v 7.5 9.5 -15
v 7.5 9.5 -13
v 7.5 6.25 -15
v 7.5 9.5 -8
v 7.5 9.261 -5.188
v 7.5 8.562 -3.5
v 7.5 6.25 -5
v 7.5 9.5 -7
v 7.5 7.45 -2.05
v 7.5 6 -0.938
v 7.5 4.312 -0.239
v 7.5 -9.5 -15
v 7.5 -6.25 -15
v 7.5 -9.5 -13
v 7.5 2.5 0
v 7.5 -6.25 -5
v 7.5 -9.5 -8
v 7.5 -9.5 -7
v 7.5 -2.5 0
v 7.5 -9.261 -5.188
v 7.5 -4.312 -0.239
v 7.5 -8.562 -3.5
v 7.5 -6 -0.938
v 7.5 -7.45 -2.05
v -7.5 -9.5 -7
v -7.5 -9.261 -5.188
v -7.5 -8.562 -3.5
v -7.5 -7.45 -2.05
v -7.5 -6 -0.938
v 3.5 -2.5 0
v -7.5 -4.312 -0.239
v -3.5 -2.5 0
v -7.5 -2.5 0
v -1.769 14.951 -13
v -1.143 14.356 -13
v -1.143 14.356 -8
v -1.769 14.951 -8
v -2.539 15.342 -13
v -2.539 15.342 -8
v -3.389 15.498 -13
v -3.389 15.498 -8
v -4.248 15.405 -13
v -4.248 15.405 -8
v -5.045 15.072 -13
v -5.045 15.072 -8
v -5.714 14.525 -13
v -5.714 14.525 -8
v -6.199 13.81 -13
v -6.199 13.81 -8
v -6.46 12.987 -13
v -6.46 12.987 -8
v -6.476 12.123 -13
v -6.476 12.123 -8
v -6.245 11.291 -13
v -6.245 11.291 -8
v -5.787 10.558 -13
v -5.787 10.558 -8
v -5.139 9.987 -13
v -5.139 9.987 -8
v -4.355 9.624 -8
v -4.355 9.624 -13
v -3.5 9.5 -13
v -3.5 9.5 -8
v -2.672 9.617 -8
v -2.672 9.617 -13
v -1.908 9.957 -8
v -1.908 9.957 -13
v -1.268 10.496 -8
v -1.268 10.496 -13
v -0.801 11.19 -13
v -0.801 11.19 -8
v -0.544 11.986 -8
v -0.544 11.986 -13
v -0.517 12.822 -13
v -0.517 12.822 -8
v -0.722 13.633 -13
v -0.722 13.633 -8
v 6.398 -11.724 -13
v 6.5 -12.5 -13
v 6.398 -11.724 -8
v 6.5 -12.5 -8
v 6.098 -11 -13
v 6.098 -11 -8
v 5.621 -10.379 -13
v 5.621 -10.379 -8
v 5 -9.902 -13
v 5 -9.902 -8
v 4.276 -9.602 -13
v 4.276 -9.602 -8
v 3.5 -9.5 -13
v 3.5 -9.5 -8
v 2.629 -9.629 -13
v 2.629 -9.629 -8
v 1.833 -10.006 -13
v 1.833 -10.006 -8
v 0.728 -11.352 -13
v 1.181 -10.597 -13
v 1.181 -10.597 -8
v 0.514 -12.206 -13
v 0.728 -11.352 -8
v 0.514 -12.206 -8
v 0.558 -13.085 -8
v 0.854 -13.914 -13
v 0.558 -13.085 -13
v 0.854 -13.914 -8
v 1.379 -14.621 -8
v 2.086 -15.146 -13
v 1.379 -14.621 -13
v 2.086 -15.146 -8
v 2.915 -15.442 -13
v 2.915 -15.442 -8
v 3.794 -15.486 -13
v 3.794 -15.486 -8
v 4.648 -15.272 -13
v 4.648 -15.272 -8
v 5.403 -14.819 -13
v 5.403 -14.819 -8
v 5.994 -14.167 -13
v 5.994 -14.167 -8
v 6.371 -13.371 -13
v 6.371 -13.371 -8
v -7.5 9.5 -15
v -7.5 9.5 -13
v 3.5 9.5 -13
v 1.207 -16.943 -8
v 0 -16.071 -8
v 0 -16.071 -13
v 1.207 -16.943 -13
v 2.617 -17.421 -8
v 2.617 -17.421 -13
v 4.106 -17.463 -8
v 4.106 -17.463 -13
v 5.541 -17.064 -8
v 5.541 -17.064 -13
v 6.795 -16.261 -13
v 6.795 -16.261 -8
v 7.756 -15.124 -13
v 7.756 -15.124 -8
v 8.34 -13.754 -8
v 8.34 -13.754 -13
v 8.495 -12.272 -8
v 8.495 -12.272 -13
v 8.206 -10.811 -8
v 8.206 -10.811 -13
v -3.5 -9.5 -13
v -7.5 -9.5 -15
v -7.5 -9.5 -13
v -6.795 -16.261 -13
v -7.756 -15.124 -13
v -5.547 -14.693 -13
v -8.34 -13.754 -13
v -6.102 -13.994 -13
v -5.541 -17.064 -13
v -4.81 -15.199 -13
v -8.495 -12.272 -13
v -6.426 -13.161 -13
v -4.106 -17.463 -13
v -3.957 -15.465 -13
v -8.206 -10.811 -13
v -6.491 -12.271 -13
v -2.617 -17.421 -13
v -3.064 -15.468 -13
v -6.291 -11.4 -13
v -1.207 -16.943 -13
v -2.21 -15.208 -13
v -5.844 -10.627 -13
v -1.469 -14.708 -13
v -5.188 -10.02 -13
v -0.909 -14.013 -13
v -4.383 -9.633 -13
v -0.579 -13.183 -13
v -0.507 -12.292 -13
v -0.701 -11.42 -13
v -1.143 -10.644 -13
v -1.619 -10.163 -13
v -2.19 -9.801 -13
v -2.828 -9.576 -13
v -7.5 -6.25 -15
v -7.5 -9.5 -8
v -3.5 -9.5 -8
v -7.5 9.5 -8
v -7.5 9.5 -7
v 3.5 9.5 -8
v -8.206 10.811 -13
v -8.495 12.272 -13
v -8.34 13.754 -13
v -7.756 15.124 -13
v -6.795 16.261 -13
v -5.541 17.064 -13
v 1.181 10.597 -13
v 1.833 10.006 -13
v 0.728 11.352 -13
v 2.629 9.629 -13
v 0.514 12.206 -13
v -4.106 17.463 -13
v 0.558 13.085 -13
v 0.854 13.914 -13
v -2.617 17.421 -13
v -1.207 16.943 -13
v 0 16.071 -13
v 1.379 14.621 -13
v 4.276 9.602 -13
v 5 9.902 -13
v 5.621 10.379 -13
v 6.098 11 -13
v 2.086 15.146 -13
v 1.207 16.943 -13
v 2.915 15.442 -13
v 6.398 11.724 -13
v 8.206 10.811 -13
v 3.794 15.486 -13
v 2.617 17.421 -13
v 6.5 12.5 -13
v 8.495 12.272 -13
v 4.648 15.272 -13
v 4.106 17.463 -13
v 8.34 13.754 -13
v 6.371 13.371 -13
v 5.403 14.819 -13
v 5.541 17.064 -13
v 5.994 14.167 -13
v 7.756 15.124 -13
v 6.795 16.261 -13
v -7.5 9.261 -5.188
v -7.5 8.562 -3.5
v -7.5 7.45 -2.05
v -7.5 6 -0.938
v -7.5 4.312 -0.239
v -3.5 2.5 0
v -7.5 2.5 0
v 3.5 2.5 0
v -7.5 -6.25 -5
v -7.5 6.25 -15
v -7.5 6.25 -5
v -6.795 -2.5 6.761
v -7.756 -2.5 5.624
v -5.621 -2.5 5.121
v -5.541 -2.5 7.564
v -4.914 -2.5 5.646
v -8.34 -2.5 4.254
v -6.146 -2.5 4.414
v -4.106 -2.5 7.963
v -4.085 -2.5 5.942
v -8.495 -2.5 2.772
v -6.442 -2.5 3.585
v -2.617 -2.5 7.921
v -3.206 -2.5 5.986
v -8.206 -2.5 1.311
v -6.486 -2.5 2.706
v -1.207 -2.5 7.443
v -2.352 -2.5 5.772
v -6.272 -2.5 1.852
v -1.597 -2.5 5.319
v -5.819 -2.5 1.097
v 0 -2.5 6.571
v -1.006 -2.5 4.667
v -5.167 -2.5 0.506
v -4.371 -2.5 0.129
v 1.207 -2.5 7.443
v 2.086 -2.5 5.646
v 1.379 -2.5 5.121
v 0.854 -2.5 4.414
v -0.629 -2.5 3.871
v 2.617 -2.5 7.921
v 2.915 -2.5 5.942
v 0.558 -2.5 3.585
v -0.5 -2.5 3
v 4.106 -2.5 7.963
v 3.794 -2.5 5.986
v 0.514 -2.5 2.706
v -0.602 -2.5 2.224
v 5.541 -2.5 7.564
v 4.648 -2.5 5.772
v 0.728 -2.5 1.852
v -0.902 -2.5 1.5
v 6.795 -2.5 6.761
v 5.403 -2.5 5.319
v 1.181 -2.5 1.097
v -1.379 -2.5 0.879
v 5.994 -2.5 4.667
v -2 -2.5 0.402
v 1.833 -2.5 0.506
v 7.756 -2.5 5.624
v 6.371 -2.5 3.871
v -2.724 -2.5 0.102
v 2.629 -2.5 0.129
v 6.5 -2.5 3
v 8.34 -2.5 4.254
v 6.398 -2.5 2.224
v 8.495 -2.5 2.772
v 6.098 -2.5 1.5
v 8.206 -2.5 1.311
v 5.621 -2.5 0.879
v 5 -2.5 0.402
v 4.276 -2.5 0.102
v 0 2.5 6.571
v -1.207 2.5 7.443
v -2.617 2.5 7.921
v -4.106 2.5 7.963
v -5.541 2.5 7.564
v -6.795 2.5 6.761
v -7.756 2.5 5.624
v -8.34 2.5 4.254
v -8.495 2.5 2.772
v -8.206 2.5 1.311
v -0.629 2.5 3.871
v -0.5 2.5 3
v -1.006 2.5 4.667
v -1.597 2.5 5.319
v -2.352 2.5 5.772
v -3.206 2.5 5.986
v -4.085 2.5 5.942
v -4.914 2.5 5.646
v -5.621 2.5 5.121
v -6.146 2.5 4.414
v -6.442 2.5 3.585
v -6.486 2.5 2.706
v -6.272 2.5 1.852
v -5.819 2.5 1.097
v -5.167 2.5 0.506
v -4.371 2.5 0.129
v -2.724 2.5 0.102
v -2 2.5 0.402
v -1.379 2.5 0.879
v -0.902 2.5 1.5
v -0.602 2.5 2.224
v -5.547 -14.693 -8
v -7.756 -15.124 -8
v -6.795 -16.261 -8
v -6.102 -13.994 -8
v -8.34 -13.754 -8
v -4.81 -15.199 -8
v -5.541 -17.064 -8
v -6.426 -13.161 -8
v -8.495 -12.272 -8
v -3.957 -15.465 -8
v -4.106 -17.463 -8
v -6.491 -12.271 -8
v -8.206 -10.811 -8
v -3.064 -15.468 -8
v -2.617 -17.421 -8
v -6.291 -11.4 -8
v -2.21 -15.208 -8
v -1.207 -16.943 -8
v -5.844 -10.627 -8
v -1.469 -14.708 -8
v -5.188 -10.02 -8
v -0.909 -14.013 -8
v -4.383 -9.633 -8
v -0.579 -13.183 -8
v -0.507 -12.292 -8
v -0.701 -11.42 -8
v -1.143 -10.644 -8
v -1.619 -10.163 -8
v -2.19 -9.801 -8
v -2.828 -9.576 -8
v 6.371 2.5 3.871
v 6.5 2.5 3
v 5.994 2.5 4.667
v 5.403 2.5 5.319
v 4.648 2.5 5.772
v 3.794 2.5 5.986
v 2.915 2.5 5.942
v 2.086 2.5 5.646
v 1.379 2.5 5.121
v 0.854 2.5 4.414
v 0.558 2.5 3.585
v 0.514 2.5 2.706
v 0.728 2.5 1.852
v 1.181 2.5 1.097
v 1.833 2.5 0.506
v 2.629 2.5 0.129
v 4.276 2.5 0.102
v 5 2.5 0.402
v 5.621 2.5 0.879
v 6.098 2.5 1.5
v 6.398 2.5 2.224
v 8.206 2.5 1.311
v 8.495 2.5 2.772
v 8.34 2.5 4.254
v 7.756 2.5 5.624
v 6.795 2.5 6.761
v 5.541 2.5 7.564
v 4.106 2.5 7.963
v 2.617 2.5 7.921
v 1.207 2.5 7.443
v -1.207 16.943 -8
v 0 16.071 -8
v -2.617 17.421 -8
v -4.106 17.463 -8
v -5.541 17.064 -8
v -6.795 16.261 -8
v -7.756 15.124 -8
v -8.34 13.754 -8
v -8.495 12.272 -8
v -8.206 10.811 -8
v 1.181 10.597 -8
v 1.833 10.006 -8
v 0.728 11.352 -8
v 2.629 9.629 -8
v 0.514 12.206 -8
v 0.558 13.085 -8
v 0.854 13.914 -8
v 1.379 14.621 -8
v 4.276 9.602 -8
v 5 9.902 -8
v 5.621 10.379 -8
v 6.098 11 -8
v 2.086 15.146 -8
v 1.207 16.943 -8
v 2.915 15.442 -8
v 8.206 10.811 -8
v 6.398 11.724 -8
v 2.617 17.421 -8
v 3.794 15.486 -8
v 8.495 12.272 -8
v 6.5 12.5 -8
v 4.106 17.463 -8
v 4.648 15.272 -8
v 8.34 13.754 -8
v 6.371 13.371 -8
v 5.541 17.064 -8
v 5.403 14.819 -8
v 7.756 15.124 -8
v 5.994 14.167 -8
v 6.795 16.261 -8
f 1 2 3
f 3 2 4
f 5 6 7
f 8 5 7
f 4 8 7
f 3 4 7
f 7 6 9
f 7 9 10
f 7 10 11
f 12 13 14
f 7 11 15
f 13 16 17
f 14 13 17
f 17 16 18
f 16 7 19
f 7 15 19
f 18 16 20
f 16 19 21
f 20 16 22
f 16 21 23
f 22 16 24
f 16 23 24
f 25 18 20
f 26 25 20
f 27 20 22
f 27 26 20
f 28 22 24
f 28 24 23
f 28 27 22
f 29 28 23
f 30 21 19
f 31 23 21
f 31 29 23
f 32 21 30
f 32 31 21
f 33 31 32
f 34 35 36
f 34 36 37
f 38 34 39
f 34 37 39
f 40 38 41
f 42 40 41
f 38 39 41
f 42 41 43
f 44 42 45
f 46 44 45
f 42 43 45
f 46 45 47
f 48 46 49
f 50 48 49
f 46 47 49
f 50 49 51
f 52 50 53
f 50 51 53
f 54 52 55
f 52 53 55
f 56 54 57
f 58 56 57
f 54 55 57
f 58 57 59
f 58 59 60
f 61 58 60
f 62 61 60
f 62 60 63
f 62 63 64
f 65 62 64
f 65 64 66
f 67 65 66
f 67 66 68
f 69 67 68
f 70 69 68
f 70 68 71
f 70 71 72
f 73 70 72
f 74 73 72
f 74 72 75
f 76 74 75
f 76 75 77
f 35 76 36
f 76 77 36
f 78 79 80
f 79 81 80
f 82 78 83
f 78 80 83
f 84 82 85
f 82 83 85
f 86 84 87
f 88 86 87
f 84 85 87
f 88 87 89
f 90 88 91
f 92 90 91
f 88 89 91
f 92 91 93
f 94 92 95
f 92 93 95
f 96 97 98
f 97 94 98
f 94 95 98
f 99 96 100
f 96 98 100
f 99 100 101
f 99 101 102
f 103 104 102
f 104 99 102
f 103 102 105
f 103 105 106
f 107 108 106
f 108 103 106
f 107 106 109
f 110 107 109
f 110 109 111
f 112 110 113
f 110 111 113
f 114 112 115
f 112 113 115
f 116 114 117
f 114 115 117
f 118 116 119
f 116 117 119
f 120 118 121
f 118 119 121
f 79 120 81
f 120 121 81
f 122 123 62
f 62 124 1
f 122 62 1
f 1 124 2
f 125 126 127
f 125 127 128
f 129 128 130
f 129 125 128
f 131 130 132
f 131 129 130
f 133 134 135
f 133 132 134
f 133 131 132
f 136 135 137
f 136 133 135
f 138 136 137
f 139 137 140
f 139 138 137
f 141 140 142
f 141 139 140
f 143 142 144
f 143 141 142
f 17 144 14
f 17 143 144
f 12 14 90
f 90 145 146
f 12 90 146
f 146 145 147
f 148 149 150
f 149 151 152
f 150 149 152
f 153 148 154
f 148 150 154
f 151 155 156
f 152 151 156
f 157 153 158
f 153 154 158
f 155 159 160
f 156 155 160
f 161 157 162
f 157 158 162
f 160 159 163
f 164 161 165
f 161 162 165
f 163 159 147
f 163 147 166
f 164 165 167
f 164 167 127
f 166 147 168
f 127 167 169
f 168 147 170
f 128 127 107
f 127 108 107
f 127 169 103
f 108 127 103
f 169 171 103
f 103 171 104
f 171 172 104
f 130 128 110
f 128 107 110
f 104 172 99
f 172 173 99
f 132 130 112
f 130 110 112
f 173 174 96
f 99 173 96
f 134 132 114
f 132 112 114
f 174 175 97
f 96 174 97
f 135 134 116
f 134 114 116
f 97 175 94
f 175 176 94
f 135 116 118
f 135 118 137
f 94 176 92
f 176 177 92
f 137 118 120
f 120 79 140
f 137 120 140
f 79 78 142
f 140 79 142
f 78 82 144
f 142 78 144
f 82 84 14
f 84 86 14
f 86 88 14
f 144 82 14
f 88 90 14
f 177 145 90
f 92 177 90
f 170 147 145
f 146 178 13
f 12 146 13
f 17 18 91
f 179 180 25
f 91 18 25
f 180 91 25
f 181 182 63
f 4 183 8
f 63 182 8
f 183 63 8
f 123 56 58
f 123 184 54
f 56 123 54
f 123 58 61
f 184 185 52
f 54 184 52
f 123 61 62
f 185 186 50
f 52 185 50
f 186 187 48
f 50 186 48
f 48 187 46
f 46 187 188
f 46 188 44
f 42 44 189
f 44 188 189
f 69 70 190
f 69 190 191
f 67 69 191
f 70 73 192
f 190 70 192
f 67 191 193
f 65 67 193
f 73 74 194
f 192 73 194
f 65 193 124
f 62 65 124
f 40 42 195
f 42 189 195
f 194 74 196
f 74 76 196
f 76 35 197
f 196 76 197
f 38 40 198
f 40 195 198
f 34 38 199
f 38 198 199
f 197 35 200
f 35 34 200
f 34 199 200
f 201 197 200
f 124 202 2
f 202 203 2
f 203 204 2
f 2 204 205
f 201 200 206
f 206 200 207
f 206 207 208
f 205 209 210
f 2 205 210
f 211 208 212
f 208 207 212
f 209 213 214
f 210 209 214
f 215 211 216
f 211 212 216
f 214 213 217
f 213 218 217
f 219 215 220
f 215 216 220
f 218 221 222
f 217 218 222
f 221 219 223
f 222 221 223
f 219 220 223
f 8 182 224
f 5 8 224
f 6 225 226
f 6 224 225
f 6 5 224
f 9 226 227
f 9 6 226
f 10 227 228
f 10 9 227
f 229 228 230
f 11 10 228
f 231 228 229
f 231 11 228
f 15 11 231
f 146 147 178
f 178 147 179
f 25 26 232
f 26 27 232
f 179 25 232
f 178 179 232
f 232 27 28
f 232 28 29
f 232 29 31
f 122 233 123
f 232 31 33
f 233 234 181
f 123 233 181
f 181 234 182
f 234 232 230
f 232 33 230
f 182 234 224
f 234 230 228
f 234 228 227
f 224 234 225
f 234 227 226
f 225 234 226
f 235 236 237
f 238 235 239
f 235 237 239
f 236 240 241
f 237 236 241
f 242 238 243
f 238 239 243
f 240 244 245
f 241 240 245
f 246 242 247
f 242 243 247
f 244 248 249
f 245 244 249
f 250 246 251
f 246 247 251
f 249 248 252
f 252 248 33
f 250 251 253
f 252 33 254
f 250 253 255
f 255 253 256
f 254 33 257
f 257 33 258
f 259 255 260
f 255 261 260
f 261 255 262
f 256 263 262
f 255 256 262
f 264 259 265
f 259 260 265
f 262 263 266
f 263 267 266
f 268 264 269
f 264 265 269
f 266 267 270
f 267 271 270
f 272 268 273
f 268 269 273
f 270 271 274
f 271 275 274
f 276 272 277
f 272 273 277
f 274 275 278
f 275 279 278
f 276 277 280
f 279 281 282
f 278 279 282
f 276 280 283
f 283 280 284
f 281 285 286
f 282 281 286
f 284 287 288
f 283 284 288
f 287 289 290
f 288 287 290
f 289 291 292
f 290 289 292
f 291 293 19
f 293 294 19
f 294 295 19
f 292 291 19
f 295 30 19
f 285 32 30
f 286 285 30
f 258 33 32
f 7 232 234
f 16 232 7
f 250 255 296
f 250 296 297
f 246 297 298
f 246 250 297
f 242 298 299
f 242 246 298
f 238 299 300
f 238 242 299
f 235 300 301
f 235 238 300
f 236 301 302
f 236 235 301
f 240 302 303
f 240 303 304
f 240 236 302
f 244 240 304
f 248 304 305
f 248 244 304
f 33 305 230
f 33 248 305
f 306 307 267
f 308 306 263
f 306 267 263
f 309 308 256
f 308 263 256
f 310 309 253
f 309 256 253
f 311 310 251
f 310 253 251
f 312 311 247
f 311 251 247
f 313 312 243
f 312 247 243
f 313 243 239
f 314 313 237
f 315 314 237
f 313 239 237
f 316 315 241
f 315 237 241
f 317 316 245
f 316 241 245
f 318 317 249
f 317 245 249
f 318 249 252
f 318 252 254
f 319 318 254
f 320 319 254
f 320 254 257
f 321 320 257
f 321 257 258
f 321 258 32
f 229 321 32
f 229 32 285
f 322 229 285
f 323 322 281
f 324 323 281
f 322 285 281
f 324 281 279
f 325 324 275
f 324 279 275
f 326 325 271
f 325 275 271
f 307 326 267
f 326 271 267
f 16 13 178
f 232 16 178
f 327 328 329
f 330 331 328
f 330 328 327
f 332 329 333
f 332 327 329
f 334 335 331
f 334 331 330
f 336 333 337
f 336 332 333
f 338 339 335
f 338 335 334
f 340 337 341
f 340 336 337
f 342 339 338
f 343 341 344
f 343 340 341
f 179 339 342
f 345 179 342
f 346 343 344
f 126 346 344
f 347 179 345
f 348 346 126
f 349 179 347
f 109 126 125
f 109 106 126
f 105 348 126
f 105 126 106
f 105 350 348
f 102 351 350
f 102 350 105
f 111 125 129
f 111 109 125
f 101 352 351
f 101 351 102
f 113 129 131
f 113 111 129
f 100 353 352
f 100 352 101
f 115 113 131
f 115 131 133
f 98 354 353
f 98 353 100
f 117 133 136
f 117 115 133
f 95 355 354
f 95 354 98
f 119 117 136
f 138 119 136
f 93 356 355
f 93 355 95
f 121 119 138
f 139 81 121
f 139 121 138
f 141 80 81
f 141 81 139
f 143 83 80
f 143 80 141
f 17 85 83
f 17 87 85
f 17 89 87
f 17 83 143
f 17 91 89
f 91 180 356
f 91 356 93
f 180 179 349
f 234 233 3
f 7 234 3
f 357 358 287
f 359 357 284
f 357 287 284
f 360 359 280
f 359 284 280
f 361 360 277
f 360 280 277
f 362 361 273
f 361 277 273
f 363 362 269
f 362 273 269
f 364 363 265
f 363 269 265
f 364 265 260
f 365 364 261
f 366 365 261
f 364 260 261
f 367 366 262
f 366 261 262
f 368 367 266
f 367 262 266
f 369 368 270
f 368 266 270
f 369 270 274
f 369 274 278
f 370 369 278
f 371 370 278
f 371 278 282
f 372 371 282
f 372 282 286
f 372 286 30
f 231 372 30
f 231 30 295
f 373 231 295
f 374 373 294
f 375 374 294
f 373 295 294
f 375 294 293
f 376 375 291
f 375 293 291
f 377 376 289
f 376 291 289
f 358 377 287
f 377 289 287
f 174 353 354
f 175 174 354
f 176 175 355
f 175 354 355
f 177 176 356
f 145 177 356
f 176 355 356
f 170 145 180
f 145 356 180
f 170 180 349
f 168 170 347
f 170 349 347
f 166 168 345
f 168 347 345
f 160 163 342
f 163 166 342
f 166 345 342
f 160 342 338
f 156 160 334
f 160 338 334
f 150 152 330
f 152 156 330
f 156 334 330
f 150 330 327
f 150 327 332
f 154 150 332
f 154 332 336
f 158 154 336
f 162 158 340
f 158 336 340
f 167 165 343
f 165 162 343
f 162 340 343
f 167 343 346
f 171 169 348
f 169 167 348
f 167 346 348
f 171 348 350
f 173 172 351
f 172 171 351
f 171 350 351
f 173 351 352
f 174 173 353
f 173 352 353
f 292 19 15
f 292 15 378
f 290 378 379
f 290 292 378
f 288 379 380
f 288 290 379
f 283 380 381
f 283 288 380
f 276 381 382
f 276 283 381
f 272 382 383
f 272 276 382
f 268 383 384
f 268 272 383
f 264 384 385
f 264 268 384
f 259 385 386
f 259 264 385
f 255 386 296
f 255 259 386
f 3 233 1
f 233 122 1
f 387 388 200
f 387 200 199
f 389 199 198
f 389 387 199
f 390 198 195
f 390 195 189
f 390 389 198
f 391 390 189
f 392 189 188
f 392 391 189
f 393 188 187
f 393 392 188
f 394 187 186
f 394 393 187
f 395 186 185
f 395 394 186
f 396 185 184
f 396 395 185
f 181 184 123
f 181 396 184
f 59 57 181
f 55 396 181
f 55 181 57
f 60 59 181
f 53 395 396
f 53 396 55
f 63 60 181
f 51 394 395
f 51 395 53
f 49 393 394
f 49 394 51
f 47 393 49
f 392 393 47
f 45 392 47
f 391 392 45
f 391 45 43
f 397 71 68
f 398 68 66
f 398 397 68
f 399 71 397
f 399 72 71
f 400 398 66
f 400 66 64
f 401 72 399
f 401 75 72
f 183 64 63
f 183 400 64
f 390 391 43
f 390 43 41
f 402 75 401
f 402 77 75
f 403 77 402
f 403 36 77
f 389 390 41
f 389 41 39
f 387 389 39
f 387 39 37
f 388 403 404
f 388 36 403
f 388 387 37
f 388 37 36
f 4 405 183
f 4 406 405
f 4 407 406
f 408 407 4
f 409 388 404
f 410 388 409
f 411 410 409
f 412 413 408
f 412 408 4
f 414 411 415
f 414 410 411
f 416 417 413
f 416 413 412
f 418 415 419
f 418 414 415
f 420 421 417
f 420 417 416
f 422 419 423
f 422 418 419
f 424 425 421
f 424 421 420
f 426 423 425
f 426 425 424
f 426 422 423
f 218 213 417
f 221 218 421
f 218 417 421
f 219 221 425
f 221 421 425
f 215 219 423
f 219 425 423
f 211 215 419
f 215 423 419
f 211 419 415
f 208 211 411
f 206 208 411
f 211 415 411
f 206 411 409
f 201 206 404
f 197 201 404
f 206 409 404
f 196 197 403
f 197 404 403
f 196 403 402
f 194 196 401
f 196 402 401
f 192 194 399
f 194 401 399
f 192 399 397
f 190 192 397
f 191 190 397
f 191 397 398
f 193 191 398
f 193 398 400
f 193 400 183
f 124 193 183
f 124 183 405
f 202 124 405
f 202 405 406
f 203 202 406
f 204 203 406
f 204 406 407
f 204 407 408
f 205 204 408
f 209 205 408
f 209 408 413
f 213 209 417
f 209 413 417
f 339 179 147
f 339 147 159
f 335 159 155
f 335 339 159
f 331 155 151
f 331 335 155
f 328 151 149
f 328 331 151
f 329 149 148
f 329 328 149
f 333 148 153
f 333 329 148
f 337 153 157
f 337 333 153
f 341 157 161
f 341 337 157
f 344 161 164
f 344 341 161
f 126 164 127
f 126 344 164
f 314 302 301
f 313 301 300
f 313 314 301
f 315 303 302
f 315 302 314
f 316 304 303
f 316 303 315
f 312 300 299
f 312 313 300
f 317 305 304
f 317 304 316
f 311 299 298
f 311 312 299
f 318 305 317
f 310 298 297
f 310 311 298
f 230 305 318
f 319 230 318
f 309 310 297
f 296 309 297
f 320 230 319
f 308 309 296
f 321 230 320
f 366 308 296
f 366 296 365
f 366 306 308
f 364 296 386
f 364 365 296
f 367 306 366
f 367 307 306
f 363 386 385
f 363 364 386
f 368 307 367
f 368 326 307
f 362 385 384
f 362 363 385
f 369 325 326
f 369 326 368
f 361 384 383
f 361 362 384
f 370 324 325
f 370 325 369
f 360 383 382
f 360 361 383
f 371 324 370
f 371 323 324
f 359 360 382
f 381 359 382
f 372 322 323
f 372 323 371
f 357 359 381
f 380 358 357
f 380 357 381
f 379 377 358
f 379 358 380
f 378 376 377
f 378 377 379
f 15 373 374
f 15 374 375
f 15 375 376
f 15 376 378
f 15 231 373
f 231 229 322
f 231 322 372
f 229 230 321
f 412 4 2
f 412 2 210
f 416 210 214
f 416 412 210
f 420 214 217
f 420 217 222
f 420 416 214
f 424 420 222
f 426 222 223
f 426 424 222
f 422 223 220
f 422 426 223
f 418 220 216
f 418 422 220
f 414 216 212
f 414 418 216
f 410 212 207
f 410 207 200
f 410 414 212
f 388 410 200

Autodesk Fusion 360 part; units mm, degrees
sketch "Sketch1" plane through (0, 0, 0) normal (0, 0, 1) x (1, 0, 0)
  line L0 (7.5, -9.5) -> (-7.5, -9.5)
  line L1 (-7.5, -9.5) -> (-7.5, 9.5)
  line L2 (-7.5, 9.5) -> (7.5, 9.5)
  line L3 (7.5, 9.5) -> (7.5, -9.5)
  line L4 (7.5, -9.5) -> (-7.5, 9.5) construction
  line L5 (-7.5, -9.5) -> (7.5, 9.5) construction
  dimension "d1" = 15
  dimension "d2" = 19
extrude "Extrude1" add sketch "Sketch1" against normal blind 15
sketch "Sketch2" plane through (0, 0, -15) normal (0, 0, -1) x (1, 0, 0)
  line L0 (-7.5, -9.5) -> (7.5, -9.5)
  line L1 (7.5, -9.5) -> (7.5, 9.5)
  line L2 (7.5, 9.5) -> (-7.5, 9.5)
  line L3 (-7.5, 9.5) -> (-7.5, -9.5)
  line L4 (7.5, 6.25) -> (-7.5, 6.25)
  line L5 (-7.5, 6.25) -> (-7.5, -6.25)
  line L6 (-7.5, -6.25) -> (7.5, -6.25)
  line L7 (7.5, -6.25) -> (7.5, 6.25)
  line L8 (7.5, 6.25) -> (-7.5, -6.25) construction
  line L9 (-7.5, 6.25) -> (7.5, -6.25) construction
  dimension "d5" = 15
  dimension "d6" = 12.5
extrude "Extrude2" cut sketch "Sketch2" against normal blind 10 contours L1 L3 L4 L5 L6 L7
fillet "Fillet1" radius 7 2 edges at (0, 9.5, 0) (0, -9.5, 0)
ref_plane "WorkPlane1" through (0, 0, 0) normal (0, 1, 0) x (0, 0, 1)
sketch "Sketch4" plane through (0, 0, 0) normal (0, 1, 0) x (1, 0, 0)
  line L0 (-7.5, 0) -> (-7.5, 7)
  line L1 (7.5, 7) -> (7.5, 0)
  line L2 (7.5, 0) -> (-7.5, 0)
  line L3 (-7.5, 7) -> (-7.5, 15)
  line L4 (7.5, 15) -> (-7.5, 15)
  line L5 (7.5, 7) -> (7.5, 15)
  line L6 (0, 0) -> (-3.5, 0) construction
  line L7 (0, 0) -> (3.5, 0) construction
  line L8 (-3.5, 0) -> (-3.5, -3) construction
  line L9 (3.5, 0) -> (3.5, -3) construction
  circle A0 centre (3.5, -3) radius 3
  circle A1 centre (-3.5, -3) radius 3
  circle A2 centre (-3.5, -3) radius 5
  circle A3 centre (3.5, -3) radius 5
  dimension "d20" = 3.5
  dimension "d21" = 3.5
  dimension "d22" = 3
  dimension "d23" = 3
  dimension "d24" = 6
  dimension "d25" = 6
  dimension "d26" = 10
  dimension "d27" = 10
extrude "Extrude3" add sketch "Sketch4" along normal mid plane 5 contours L2 A2 A3 | L2 A1 A2 A3 | L2 A1 A3 | L2 A2 A3 | L2 A0 A1 A2 A3 | L2 A0 A2 A3 | L2 A0 A2 picked at (-1.7132, 0.4693) picked at (1.7132, 0.4693)
ref_plane "WorkPlane2" through (0, 0, -8) normal (0, 0, 1) x (1, 0, 0)
sketch "Sketch5" plane through (0, 0, -8) normal (0, 0, 1) x (1, 0, 0)
  line L0 (-7.5, 6.25) -> (-7.5, 9.5)
  line L1 (-7.5, -9.5) -> (-7.5, -6.25)
  line L2 (-7.5, 9.5) -> (7.5, 9.5)
  line L3 (7.5, 9.5) -> (7.5, 6.25)
  line L4 (7.5, -6.25) -> (7.5, -9.5)
  line L5 (7.5, -9.5) -> (-7.5, -9.5)
  line L6 (0, 9.5) -> (-3.5, 9.5) construction
  line L7 (0, 9.5) -> (3.5, 9.5) construction
  line L8 (-3.5, 9.5) -> (-3.5, 12.5) construction
  line L9 (3.5, 9.5) -> (3.5, 12.5) construction
  line L10 (10.0516, 0) -> (-10.1091, 0) construction
  circle A0 centre (3.5, 12.5) radius 3
  circle A1 centre (-3.5, 12.5) radius 3
  circle A2 centre (-3.5, 12.5) radius 5
  circle A3 centre (3.5, 12.5) radius 5
  circle A4 centre (3.5, -12.5) radius 5
  circle A5 centre (3.5, -12.5) radius 3
  circle A6 centre (-3.5, -12.5) radius 5
  circle A7 centre (-3.5, -12.5) radius 3
  line L11 (8.5, 2.5) -> (7.5, 2.5)
  line L12 (7.5, -2.5) -> (8.5, -2.5)
  line L13 (7.5, -6.25) -> (7.5, -2.5)
  line L14 (7.5, 2.5) -> (7.5, 6.25)
  line L15 (8.5, 2.5) -> (8.5, -2.5)
  line L16 (-7.5, 2.5) -> (-8.5, 2.5)
  line L17 (-8.5, -2.5) -> (-7.5, -2.5)
  line L18 (-7.5, 6.25) -> (-7.5, 2.5)
  line L19 (-7.5, -2.5) -> (-7.5, -6.25)
  line L20 (-8.5, 2.5) -> (-8.5, -2.5)
  dimension "d31" = 3.5
  dimension "d32" = 3.5
  dimension "d33" = 3
  dimension "d34" = 3
  dimension "d35" = 6
  dimension "d36" = 6
  dimension "d37" = 10
  dimension "d38" = 10
extrude "Extrude4" add sketch "Sketch5" against normal blind 5 contours L2 A1 A2 A3 | L2 A1 A3 | L2 A0 A2 A3 | L2 A0 A1 A2 A3 | L2 A0 A2 | L5 A4 A6 A7 | L5 A4 A7 | L5 A4 A5 A6 | L5 A4 A5 A6 A7 | L5 A5 A6
equation "d2 = 13 mm + 3 mm + 3 mm"
